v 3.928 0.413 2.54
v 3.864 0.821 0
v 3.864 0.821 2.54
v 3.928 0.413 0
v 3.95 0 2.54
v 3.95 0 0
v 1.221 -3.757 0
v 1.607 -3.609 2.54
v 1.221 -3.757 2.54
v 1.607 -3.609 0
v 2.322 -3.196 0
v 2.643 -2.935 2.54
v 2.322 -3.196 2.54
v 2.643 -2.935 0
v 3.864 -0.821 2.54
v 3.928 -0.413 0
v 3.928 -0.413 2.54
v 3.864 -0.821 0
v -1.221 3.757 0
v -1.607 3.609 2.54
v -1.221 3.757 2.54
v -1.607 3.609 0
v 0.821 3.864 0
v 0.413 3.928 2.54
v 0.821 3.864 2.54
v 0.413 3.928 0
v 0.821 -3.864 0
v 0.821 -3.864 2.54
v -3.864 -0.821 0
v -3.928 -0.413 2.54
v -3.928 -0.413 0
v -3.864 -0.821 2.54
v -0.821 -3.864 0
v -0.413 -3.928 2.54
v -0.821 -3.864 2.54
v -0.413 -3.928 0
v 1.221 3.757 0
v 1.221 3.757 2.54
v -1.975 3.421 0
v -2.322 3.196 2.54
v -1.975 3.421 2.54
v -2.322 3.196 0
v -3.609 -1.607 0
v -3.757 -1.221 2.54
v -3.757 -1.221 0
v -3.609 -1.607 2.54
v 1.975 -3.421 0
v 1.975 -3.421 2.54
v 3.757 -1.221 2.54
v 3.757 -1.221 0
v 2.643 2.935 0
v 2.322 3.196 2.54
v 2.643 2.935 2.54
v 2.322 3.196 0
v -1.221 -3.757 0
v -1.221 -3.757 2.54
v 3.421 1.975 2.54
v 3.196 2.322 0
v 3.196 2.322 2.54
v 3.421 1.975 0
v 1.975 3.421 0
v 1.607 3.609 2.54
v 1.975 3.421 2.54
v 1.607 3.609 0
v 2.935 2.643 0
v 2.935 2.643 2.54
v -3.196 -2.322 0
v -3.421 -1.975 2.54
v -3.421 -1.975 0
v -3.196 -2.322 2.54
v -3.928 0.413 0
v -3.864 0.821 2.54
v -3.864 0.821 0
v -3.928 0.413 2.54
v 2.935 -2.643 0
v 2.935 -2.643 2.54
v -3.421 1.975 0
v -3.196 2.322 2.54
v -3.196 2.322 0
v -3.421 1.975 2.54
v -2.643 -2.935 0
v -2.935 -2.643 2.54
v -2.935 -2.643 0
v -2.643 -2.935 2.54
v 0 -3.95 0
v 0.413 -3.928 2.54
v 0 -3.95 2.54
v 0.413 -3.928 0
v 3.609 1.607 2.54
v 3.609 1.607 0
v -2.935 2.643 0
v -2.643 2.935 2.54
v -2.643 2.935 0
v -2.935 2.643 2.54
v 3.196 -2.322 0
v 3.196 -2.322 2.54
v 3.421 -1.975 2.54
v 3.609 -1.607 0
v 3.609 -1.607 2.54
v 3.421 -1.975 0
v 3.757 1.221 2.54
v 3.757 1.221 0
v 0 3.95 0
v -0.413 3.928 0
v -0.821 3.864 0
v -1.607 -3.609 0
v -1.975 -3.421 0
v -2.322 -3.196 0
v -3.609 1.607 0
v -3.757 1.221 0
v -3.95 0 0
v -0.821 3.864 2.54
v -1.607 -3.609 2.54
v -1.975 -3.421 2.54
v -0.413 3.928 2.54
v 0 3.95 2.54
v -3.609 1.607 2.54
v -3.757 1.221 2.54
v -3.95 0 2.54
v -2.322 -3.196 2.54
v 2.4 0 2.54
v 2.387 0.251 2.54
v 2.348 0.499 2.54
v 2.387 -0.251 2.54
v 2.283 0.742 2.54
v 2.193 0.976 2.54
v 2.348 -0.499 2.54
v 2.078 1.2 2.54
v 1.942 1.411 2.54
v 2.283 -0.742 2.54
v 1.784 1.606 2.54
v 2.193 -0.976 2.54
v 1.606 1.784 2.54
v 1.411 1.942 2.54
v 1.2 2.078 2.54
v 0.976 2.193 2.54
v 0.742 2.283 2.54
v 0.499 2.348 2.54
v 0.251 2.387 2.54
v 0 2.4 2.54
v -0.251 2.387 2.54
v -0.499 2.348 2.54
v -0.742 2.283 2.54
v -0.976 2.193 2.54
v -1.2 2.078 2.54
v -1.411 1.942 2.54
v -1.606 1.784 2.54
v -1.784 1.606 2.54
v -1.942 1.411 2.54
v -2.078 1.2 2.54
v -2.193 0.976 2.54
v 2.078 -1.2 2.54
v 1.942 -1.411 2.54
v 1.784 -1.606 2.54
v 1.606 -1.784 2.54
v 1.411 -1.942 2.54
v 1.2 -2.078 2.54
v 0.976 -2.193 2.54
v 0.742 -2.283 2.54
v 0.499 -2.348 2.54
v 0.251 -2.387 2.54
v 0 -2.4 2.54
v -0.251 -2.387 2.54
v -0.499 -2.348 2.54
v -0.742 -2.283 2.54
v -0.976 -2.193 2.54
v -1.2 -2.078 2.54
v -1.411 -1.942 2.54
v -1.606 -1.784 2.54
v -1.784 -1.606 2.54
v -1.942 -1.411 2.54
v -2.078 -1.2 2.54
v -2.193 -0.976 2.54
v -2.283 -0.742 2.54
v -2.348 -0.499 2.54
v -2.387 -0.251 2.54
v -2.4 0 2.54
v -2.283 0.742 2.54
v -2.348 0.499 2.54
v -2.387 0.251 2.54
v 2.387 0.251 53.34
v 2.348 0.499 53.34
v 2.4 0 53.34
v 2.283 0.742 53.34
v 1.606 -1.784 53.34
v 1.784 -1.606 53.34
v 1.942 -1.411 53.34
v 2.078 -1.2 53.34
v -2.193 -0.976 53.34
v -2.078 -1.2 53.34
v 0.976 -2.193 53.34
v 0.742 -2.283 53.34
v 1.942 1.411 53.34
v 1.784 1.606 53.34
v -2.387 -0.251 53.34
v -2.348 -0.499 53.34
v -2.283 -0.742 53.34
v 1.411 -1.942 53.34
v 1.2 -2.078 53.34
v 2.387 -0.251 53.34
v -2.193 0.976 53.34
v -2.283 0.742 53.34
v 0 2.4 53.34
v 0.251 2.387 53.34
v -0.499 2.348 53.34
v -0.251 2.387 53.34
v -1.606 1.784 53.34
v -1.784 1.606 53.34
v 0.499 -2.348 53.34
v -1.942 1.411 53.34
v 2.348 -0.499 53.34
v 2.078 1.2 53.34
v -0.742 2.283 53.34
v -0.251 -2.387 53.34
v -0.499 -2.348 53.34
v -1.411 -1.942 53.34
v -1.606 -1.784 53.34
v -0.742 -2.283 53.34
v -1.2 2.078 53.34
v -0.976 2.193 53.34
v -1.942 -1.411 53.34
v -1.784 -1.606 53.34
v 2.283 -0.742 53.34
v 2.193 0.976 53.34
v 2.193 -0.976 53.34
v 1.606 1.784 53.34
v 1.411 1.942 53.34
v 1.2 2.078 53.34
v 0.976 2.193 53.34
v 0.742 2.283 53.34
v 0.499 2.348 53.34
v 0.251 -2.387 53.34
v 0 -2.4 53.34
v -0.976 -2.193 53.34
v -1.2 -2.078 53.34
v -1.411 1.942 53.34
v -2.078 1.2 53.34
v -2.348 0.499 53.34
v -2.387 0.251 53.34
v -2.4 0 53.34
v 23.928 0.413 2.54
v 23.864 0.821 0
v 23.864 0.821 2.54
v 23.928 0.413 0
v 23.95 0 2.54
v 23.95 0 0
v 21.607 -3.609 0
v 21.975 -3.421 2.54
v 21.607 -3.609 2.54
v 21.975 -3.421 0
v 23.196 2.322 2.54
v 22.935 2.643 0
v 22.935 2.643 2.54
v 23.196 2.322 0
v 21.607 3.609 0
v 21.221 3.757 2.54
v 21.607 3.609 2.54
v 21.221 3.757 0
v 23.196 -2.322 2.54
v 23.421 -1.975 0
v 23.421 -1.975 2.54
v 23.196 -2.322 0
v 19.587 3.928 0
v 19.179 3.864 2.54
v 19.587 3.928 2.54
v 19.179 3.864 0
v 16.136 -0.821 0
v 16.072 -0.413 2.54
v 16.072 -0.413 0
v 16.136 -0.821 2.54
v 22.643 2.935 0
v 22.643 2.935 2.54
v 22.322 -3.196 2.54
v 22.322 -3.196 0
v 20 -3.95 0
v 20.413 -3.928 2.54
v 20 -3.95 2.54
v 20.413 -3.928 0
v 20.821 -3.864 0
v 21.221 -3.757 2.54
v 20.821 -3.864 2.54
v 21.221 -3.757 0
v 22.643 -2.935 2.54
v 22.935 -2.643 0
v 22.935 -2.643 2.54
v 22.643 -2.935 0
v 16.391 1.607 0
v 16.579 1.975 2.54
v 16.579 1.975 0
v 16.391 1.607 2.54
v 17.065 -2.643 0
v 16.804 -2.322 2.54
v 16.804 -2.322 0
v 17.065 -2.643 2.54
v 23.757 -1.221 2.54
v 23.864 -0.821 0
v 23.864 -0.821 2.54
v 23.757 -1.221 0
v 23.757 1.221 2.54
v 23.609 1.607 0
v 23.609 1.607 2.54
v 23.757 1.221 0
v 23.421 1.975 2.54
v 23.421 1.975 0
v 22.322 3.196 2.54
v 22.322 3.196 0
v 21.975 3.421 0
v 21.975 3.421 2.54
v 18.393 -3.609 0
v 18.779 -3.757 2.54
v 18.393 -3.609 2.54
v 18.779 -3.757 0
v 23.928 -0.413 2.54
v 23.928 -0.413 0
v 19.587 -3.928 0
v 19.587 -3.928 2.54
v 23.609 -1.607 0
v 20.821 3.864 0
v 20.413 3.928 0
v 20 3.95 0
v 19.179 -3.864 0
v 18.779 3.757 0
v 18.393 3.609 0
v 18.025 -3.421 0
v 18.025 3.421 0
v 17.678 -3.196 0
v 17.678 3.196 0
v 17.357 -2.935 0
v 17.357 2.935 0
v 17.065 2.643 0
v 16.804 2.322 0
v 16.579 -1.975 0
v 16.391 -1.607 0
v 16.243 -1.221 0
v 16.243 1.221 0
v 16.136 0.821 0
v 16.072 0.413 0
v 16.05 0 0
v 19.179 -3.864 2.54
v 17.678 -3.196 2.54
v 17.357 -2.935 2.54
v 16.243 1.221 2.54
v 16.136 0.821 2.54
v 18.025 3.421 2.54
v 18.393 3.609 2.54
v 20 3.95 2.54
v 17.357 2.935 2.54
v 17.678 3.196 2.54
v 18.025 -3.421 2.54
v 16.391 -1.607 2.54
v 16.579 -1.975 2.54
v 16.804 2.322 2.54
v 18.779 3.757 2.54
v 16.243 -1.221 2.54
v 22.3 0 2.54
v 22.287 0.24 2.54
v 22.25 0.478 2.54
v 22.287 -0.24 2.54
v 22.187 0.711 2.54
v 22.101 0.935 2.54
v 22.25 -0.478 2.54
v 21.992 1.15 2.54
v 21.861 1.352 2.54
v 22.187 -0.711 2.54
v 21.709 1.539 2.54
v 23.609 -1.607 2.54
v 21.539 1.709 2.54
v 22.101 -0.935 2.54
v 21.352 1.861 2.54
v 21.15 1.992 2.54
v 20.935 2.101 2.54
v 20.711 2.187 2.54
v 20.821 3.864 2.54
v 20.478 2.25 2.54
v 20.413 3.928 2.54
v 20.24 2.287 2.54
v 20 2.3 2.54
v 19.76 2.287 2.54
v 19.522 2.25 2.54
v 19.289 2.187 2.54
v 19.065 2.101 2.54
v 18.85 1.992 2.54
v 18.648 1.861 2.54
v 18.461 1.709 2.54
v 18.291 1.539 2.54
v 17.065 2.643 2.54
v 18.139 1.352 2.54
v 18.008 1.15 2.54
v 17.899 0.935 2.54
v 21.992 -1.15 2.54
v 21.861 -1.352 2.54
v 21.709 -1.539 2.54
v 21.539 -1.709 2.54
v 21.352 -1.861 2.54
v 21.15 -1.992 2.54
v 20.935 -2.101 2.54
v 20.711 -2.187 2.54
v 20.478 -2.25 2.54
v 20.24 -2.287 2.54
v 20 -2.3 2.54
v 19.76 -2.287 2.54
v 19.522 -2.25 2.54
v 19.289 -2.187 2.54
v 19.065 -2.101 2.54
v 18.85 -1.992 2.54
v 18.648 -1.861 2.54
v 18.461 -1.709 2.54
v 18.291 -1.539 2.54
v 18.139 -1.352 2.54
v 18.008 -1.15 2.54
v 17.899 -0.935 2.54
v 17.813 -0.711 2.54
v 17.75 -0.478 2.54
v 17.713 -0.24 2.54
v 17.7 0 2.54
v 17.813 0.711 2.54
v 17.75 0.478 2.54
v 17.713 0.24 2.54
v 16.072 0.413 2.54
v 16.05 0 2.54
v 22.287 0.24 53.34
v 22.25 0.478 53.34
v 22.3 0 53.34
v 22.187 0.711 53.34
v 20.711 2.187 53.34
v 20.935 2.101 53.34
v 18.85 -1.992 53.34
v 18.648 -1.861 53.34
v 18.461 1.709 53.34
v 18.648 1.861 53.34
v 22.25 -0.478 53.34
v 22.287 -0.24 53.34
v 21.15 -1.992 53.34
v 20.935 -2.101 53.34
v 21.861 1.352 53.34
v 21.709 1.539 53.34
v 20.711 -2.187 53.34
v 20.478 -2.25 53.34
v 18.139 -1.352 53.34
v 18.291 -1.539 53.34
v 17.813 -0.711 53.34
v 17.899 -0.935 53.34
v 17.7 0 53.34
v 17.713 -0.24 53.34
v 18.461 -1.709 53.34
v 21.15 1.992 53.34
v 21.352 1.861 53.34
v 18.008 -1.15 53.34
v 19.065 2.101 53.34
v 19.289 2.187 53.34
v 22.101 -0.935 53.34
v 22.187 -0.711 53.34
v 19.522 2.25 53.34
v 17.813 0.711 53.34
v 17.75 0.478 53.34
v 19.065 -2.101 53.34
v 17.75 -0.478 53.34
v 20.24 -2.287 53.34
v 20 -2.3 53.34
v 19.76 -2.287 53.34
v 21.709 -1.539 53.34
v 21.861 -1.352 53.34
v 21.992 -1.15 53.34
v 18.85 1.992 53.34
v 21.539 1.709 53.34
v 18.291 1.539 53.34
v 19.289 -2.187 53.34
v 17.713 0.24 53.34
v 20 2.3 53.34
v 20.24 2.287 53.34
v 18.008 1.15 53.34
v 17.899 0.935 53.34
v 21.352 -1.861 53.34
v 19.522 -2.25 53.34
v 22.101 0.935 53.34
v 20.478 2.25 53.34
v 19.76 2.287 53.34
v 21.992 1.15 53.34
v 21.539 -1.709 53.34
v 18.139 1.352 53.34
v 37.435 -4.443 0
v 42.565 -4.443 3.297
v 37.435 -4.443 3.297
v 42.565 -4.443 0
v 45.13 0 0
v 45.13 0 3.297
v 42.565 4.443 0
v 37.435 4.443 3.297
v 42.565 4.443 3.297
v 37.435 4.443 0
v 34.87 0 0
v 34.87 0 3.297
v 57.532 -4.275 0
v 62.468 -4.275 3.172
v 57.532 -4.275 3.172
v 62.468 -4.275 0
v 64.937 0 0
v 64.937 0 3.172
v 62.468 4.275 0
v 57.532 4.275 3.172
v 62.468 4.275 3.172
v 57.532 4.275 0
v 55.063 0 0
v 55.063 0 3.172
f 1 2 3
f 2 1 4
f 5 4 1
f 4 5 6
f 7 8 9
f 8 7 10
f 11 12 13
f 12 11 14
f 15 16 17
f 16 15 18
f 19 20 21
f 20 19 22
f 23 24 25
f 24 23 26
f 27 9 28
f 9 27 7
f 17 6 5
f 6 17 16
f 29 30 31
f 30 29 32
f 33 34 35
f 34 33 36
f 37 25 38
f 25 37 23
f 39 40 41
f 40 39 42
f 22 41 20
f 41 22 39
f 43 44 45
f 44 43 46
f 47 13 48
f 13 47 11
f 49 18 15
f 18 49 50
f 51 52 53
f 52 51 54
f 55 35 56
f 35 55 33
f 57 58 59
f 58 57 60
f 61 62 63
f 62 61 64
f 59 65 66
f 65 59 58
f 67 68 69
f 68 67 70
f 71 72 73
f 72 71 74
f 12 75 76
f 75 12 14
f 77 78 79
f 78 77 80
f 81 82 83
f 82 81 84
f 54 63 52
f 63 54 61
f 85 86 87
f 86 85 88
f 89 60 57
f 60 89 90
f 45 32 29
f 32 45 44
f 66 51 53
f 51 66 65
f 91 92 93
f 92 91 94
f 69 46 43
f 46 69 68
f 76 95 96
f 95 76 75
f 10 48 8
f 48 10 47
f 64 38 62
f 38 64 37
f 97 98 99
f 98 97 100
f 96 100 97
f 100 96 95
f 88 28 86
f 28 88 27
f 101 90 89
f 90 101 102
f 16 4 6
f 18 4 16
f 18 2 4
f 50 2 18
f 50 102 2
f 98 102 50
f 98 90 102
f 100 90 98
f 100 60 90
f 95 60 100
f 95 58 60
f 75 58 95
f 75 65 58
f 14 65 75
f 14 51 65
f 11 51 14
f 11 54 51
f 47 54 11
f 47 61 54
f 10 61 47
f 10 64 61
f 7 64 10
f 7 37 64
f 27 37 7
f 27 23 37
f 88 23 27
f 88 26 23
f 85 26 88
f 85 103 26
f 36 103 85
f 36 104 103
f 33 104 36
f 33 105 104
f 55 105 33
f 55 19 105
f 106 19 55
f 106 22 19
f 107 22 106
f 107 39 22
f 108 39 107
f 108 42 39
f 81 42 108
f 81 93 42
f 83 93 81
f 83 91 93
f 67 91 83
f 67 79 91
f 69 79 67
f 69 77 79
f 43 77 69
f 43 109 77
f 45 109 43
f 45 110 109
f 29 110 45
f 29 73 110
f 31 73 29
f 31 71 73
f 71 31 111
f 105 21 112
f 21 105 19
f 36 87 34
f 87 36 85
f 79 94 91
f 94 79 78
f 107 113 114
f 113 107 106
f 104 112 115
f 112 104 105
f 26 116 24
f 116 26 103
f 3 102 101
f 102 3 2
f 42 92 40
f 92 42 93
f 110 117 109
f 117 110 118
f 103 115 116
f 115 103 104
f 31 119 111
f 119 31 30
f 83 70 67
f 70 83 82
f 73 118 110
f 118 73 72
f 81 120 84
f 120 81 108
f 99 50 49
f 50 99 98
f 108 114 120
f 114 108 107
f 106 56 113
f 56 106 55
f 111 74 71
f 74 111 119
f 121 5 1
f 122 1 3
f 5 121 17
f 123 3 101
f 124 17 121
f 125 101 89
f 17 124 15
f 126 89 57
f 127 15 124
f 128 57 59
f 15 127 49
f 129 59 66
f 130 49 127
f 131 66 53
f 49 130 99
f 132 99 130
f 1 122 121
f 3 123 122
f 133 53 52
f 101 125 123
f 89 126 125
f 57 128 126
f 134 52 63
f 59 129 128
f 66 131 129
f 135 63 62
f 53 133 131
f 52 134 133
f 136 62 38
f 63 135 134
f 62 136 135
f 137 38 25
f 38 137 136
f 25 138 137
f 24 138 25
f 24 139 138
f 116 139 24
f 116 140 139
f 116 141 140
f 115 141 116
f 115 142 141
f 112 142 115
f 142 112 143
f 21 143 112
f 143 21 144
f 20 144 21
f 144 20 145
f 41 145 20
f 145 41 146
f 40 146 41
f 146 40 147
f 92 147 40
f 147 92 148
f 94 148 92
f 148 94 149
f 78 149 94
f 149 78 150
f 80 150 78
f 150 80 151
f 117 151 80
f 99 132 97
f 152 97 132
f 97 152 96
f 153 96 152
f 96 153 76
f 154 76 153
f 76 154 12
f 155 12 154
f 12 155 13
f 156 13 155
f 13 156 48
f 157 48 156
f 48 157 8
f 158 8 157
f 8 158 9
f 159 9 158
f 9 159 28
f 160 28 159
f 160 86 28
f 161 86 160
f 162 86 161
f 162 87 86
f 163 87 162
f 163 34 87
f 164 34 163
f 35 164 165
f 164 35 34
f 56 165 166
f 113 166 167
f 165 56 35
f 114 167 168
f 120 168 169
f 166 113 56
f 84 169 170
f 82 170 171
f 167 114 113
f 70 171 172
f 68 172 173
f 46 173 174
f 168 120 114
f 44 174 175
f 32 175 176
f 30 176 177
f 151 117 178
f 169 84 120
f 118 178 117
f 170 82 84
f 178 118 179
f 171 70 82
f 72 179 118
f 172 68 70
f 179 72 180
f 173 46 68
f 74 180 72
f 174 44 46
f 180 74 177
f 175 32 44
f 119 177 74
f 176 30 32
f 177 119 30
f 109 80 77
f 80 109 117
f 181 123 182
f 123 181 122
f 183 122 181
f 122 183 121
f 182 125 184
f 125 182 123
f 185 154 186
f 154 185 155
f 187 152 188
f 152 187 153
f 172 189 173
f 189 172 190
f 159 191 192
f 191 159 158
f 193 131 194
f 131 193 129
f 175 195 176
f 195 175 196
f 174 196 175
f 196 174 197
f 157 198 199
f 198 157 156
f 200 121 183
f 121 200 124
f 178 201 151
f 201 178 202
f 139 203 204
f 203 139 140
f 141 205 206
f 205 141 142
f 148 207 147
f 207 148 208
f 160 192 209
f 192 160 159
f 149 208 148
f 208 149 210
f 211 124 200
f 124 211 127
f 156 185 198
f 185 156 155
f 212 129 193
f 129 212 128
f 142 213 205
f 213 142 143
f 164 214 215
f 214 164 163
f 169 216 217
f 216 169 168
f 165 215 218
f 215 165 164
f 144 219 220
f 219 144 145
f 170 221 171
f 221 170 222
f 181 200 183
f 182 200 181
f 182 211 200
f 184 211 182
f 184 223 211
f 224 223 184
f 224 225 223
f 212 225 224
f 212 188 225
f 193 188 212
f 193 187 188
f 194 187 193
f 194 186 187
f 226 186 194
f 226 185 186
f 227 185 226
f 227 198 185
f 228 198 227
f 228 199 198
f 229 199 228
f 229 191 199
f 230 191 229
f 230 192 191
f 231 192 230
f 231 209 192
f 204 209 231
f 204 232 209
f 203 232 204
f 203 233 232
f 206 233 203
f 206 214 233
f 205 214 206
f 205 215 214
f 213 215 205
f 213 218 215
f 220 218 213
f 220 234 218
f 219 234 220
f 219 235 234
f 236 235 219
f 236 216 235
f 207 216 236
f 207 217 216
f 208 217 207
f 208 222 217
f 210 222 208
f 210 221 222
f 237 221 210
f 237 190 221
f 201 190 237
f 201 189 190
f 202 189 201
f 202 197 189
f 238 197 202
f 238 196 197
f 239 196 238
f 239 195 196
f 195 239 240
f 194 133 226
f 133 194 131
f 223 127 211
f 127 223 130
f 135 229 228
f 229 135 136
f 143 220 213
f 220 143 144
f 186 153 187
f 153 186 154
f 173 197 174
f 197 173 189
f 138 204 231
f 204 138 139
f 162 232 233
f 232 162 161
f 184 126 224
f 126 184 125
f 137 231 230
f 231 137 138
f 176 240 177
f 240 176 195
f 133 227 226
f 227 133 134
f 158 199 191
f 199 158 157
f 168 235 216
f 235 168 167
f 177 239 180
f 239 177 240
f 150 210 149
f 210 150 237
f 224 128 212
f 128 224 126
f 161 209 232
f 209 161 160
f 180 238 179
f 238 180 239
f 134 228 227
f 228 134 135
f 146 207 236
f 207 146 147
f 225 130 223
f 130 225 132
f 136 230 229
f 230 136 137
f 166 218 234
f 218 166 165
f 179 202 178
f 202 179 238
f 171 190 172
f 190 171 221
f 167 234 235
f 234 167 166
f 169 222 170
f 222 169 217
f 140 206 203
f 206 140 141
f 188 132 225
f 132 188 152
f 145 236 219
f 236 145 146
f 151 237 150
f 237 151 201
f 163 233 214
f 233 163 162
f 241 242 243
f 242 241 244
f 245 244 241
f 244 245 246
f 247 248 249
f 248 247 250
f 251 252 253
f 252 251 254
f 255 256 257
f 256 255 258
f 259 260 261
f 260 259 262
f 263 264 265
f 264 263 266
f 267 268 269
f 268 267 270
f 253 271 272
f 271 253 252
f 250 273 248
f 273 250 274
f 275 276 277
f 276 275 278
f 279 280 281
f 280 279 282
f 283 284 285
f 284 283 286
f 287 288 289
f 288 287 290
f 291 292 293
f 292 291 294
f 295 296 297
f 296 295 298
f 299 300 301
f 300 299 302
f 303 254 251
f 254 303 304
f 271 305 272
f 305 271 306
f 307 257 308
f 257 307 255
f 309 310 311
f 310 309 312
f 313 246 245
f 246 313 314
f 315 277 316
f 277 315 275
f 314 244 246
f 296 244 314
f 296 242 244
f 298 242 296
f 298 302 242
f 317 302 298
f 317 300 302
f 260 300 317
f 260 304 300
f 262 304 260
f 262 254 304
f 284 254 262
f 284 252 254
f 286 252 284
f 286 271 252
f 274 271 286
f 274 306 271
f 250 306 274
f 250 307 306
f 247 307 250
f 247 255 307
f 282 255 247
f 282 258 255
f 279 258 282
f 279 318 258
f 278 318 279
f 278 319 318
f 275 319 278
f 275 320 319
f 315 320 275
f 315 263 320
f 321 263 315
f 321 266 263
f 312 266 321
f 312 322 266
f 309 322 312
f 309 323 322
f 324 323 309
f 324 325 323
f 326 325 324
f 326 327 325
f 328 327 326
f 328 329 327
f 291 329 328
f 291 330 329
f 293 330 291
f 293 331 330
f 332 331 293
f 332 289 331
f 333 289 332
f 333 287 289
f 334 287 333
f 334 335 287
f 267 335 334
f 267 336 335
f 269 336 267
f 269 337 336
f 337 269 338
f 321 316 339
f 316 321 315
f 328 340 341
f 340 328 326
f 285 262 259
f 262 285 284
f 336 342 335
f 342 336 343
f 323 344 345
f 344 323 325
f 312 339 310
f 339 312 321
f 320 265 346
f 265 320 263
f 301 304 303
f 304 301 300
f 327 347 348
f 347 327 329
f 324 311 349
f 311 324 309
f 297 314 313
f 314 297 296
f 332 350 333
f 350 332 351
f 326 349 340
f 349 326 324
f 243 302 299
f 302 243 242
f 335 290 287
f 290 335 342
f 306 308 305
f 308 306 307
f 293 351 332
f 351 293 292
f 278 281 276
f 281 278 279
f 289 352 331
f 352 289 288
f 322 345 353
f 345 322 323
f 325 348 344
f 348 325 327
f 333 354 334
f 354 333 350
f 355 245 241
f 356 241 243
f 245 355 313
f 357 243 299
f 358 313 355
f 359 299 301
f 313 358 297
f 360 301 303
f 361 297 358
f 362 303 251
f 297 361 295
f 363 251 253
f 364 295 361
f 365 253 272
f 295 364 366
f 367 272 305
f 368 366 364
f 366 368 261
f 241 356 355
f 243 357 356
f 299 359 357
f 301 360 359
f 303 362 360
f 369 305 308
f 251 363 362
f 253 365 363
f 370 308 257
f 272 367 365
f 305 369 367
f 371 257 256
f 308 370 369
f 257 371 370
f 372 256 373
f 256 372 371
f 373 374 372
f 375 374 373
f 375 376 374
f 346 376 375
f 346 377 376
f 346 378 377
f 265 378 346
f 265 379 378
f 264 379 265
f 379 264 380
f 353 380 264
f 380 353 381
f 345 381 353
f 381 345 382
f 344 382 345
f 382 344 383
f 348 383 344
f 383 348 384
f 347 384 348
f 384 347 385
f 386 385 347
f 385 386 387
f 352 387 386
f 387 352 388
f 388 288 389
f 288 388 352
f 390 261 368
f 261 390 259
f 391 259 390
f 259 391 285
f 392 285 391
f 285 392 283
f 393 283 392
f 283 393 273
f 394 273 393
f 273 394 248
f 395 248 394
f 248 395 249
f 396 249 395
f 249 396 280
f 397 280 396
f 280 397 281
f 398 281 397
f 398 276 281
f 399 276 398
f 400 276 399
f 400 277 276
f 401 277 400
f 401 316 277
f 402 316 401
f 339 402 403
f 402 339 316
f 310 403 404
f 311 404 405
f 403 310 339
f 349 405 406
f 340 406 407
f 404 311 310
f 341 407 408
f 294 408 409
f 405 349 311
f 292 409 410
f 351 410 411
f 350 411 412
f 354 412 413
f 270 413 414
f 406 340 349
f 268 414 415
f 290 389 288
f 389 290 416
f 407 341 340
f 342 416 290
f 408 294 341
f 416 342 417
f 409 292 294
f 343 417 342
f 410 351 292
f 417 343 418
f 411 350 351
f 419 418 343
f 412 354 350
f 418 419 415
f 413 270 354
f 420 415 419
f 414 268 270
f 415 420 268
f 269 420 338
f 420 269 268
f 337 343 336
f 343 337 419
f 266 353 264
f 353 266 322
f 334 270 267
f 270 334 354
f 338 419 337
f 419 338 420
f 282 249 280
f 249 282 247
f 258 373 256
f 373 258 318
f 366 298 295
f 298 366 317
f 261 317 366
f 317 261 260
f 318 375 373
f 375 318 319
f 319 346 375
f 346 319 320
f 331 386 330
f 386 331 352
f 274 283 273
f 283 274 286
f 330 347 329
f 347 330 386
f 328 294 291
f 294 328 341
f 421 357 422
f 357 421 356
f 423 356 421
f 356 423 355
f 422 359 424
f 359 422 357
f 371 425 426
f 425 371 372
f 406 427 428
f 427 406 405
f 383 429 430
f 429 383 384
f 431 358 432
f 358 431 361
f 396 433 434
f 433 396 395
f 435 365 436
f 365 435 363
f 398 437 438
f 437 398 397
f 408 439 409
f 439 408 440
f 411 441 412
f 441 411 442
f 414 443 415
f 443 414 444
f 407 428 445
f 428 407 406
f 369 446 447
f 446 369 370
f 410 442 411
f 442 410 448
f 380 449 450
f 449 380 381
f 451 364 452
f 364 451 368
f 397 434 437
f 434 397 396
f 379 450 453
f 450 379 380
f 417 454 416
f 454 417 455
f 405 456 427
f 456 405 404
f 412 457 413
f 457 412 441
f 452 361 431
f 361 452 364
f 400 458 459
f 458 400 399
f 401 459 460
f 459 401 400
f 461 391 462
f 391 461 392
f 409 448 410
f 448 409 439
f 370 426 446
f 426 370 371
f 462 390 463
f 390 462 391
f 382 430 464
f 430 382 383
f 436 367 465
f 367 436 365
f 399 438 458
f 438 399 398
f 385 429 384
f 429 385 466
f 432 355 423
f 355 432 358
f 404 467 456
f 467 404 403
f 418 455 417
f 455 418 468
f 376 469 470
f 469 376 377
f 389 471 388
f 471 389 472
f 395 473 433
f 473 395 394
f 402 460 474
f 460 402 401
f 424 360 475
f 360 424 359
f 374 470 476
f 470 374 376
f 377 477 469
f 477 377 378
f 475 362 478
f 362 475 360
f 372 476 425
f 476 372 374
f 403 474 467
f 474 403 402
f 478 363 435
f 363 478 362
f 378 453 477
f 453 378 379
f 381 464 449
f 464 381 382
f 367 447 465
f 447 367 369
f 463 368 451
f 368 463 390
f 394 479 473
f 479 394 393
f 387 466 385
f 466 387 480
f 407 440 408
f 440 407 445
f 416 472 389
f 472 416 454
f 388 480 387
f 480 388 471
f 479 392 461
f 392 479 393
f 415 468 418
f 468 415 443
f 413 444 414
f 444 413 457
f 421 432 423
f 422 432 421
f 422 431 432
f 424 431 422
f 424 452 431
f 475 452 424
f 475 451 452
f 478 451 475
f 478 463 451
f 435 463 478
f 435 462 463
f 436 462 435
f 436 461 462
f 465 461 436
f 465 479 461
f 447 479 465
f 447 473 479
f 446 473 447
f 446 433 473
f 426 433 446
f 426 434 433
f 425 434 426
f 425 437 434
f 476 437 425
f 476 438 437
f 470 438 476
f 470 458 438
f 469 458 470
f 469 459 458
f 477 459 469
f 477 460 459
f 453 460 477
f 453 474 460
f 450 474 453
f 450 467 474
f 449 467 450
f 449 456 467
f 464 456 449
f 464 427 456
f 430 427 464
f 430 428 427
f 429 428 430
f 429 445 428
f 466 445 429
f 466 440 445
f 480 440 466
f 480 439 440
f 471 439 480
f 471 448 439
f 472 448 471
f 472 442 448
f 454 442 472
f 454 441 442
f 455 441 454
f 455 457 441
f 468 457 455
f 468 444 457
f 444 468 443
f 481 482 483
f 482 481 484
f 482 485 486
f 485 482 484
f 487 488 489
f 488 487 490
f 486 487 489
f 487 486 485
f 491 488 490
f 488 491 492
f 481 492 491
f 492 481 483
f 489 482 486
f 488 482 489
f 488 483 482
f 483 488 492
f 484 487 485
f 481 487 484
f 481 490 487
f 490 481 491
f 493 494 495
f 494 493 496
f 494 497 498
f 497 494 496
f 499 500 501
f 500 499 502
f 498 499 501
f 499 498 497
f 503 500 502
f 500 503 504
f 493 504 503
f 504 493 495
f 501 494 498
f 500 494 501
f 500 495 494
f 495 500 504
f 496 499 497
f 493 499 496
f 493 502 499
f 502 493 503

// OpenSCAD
SCREW_SHAFT_DIA = 4.3;
SCREW_HEAD_HEIGHT = 2.54;
SCREW_HEAD_DIA = 7.9;
NUT_FLAT_TO_FLAT = 8.52;
NUT_POINT_TO_POINT = 9.68;
NUT_THICKNESS = 3.11;
FN = 60;
SCREW_OUTLINE_SCALE_FACTOR = 1.1;
NUT_SCALE_FACTOR = 1.06;
NYLON_NUT_SCALE_FACTOR = 1.02;
NUT_HEIGHT_SCALE_FACTOR = 1.1;

module rounded_cube(h, w, d, diag=3) {
    difference() {
        cube([h, w, d]);
        rounded_cube_bezel(h, w, d, diag);
    }
}

module rounded_cube_bezel(h, w, d, diag=3) {
    translate([0, w, 0]) face_bezel(w, d, diag);
    side = sqrt(diag * diag / 2);
    translate([h, w, 0]) rotate([0, 270, 0]) face_bezel(w, h, diag);
    translate([h, w, d]) rotate([0, -180, 0]) face_bezel(w, d, diag);;
    translate([0, w, d]) rotate([0, 90, 0]) face_bezel(w, h, diag);
}

module face_bezel(d1, d2, diag=3) {
    side = sqrt(diag * diag / 2);
    translate([side, 0, side]) rotate([90, 180, 0]) bezel_cutout(d1, diag);
    translate([side, -d1, (d2 - side)]) rotate([270, 180, 0]) bezel_cutout(d1, diag);
    translate([side, -side, d2]) rotate([0, 180, 0]) bezel_cutout(d2, diag);
    translate([side, -(d1 - side), d2]) rotate([0, 180, 90]) bezel_cutout(d2, diag);
}

module bezel_cutout(length, diag) {
    side = sqrt(diag * diag / 2);
    linear_extrude(length) {
      bezel_shape(side);
  }
}

module bezel_shape(side) {
      difference() {
        square(side, false);
        circle(side, $fn=40);
      }
  }

module screw(shaft_length_in) {
    shaft_length = (25.4 * shaft_length_in) + 1;
    union() {
    cylinder(SCREW_HEAD_HEIGHT, d=SCREW_HEAD_DIA, $fn=FN);
    translate([0, 0, SCREW_HEAD_HEIGHT - 1]) cylinder(shaft_length, d=SCREW_SHAFT_DIA + 0.5, $fn=FN);
    }
}

module nylon_screw(shaft_length_in) {
    shaft_length = (25.4 * shaft_length_in) + 1;
    union() {
    cylinder(SCREW_HEAD_HEIGHT, d=SCREW_HEAD_DIA, $fn=FN);
    translate([0, 0, SCREW_HEAD_HEIGHT - 1]) cylinder(shaft_length, d=SCREW_SHAFT_DIA + 0.3, $fn=FN);
    }
}

module hex_nut() {
    cylinder(NUT_THICKNESS * NUT_SCALE_FACTOR, d=NUT_POINT_TO_POINT * NUT_SCALE_FACTOR, $fn=6);
}

module nylon_hex_nut() {
    cylinder(NUT_THICKNESS * NYLON_NUT_SCALE_FACTOR, d=NUT_POINT_TO_POINT * NYLON_NUT_SCALE_FACTOR, $fn=6);
}

module hex_nut_pocket(depth) {
    rounded_cube(depth, NUT_FLAT_TO_FLAT * NUT_HEIGHT_SCALE_FACTOR, NUT_THICKNESS* NUT_SCALE_FACTOR);
}

module screw_recess(shaft_length_in) {
    scale([SCREW_OUTLINE_SCALE_FACTOR, SCREW_OUTLINE_SCALE_FACTOR, 1]) screw(shaft_length_in);
}

module test() {
    screw(2);
    translate([20, 0, 0]) nylon_screw(2);
    translate([40, 0, 0]) hex_nut();
    translate([60, 0, 0]) nylon_hex_nut(2);
}

test();
